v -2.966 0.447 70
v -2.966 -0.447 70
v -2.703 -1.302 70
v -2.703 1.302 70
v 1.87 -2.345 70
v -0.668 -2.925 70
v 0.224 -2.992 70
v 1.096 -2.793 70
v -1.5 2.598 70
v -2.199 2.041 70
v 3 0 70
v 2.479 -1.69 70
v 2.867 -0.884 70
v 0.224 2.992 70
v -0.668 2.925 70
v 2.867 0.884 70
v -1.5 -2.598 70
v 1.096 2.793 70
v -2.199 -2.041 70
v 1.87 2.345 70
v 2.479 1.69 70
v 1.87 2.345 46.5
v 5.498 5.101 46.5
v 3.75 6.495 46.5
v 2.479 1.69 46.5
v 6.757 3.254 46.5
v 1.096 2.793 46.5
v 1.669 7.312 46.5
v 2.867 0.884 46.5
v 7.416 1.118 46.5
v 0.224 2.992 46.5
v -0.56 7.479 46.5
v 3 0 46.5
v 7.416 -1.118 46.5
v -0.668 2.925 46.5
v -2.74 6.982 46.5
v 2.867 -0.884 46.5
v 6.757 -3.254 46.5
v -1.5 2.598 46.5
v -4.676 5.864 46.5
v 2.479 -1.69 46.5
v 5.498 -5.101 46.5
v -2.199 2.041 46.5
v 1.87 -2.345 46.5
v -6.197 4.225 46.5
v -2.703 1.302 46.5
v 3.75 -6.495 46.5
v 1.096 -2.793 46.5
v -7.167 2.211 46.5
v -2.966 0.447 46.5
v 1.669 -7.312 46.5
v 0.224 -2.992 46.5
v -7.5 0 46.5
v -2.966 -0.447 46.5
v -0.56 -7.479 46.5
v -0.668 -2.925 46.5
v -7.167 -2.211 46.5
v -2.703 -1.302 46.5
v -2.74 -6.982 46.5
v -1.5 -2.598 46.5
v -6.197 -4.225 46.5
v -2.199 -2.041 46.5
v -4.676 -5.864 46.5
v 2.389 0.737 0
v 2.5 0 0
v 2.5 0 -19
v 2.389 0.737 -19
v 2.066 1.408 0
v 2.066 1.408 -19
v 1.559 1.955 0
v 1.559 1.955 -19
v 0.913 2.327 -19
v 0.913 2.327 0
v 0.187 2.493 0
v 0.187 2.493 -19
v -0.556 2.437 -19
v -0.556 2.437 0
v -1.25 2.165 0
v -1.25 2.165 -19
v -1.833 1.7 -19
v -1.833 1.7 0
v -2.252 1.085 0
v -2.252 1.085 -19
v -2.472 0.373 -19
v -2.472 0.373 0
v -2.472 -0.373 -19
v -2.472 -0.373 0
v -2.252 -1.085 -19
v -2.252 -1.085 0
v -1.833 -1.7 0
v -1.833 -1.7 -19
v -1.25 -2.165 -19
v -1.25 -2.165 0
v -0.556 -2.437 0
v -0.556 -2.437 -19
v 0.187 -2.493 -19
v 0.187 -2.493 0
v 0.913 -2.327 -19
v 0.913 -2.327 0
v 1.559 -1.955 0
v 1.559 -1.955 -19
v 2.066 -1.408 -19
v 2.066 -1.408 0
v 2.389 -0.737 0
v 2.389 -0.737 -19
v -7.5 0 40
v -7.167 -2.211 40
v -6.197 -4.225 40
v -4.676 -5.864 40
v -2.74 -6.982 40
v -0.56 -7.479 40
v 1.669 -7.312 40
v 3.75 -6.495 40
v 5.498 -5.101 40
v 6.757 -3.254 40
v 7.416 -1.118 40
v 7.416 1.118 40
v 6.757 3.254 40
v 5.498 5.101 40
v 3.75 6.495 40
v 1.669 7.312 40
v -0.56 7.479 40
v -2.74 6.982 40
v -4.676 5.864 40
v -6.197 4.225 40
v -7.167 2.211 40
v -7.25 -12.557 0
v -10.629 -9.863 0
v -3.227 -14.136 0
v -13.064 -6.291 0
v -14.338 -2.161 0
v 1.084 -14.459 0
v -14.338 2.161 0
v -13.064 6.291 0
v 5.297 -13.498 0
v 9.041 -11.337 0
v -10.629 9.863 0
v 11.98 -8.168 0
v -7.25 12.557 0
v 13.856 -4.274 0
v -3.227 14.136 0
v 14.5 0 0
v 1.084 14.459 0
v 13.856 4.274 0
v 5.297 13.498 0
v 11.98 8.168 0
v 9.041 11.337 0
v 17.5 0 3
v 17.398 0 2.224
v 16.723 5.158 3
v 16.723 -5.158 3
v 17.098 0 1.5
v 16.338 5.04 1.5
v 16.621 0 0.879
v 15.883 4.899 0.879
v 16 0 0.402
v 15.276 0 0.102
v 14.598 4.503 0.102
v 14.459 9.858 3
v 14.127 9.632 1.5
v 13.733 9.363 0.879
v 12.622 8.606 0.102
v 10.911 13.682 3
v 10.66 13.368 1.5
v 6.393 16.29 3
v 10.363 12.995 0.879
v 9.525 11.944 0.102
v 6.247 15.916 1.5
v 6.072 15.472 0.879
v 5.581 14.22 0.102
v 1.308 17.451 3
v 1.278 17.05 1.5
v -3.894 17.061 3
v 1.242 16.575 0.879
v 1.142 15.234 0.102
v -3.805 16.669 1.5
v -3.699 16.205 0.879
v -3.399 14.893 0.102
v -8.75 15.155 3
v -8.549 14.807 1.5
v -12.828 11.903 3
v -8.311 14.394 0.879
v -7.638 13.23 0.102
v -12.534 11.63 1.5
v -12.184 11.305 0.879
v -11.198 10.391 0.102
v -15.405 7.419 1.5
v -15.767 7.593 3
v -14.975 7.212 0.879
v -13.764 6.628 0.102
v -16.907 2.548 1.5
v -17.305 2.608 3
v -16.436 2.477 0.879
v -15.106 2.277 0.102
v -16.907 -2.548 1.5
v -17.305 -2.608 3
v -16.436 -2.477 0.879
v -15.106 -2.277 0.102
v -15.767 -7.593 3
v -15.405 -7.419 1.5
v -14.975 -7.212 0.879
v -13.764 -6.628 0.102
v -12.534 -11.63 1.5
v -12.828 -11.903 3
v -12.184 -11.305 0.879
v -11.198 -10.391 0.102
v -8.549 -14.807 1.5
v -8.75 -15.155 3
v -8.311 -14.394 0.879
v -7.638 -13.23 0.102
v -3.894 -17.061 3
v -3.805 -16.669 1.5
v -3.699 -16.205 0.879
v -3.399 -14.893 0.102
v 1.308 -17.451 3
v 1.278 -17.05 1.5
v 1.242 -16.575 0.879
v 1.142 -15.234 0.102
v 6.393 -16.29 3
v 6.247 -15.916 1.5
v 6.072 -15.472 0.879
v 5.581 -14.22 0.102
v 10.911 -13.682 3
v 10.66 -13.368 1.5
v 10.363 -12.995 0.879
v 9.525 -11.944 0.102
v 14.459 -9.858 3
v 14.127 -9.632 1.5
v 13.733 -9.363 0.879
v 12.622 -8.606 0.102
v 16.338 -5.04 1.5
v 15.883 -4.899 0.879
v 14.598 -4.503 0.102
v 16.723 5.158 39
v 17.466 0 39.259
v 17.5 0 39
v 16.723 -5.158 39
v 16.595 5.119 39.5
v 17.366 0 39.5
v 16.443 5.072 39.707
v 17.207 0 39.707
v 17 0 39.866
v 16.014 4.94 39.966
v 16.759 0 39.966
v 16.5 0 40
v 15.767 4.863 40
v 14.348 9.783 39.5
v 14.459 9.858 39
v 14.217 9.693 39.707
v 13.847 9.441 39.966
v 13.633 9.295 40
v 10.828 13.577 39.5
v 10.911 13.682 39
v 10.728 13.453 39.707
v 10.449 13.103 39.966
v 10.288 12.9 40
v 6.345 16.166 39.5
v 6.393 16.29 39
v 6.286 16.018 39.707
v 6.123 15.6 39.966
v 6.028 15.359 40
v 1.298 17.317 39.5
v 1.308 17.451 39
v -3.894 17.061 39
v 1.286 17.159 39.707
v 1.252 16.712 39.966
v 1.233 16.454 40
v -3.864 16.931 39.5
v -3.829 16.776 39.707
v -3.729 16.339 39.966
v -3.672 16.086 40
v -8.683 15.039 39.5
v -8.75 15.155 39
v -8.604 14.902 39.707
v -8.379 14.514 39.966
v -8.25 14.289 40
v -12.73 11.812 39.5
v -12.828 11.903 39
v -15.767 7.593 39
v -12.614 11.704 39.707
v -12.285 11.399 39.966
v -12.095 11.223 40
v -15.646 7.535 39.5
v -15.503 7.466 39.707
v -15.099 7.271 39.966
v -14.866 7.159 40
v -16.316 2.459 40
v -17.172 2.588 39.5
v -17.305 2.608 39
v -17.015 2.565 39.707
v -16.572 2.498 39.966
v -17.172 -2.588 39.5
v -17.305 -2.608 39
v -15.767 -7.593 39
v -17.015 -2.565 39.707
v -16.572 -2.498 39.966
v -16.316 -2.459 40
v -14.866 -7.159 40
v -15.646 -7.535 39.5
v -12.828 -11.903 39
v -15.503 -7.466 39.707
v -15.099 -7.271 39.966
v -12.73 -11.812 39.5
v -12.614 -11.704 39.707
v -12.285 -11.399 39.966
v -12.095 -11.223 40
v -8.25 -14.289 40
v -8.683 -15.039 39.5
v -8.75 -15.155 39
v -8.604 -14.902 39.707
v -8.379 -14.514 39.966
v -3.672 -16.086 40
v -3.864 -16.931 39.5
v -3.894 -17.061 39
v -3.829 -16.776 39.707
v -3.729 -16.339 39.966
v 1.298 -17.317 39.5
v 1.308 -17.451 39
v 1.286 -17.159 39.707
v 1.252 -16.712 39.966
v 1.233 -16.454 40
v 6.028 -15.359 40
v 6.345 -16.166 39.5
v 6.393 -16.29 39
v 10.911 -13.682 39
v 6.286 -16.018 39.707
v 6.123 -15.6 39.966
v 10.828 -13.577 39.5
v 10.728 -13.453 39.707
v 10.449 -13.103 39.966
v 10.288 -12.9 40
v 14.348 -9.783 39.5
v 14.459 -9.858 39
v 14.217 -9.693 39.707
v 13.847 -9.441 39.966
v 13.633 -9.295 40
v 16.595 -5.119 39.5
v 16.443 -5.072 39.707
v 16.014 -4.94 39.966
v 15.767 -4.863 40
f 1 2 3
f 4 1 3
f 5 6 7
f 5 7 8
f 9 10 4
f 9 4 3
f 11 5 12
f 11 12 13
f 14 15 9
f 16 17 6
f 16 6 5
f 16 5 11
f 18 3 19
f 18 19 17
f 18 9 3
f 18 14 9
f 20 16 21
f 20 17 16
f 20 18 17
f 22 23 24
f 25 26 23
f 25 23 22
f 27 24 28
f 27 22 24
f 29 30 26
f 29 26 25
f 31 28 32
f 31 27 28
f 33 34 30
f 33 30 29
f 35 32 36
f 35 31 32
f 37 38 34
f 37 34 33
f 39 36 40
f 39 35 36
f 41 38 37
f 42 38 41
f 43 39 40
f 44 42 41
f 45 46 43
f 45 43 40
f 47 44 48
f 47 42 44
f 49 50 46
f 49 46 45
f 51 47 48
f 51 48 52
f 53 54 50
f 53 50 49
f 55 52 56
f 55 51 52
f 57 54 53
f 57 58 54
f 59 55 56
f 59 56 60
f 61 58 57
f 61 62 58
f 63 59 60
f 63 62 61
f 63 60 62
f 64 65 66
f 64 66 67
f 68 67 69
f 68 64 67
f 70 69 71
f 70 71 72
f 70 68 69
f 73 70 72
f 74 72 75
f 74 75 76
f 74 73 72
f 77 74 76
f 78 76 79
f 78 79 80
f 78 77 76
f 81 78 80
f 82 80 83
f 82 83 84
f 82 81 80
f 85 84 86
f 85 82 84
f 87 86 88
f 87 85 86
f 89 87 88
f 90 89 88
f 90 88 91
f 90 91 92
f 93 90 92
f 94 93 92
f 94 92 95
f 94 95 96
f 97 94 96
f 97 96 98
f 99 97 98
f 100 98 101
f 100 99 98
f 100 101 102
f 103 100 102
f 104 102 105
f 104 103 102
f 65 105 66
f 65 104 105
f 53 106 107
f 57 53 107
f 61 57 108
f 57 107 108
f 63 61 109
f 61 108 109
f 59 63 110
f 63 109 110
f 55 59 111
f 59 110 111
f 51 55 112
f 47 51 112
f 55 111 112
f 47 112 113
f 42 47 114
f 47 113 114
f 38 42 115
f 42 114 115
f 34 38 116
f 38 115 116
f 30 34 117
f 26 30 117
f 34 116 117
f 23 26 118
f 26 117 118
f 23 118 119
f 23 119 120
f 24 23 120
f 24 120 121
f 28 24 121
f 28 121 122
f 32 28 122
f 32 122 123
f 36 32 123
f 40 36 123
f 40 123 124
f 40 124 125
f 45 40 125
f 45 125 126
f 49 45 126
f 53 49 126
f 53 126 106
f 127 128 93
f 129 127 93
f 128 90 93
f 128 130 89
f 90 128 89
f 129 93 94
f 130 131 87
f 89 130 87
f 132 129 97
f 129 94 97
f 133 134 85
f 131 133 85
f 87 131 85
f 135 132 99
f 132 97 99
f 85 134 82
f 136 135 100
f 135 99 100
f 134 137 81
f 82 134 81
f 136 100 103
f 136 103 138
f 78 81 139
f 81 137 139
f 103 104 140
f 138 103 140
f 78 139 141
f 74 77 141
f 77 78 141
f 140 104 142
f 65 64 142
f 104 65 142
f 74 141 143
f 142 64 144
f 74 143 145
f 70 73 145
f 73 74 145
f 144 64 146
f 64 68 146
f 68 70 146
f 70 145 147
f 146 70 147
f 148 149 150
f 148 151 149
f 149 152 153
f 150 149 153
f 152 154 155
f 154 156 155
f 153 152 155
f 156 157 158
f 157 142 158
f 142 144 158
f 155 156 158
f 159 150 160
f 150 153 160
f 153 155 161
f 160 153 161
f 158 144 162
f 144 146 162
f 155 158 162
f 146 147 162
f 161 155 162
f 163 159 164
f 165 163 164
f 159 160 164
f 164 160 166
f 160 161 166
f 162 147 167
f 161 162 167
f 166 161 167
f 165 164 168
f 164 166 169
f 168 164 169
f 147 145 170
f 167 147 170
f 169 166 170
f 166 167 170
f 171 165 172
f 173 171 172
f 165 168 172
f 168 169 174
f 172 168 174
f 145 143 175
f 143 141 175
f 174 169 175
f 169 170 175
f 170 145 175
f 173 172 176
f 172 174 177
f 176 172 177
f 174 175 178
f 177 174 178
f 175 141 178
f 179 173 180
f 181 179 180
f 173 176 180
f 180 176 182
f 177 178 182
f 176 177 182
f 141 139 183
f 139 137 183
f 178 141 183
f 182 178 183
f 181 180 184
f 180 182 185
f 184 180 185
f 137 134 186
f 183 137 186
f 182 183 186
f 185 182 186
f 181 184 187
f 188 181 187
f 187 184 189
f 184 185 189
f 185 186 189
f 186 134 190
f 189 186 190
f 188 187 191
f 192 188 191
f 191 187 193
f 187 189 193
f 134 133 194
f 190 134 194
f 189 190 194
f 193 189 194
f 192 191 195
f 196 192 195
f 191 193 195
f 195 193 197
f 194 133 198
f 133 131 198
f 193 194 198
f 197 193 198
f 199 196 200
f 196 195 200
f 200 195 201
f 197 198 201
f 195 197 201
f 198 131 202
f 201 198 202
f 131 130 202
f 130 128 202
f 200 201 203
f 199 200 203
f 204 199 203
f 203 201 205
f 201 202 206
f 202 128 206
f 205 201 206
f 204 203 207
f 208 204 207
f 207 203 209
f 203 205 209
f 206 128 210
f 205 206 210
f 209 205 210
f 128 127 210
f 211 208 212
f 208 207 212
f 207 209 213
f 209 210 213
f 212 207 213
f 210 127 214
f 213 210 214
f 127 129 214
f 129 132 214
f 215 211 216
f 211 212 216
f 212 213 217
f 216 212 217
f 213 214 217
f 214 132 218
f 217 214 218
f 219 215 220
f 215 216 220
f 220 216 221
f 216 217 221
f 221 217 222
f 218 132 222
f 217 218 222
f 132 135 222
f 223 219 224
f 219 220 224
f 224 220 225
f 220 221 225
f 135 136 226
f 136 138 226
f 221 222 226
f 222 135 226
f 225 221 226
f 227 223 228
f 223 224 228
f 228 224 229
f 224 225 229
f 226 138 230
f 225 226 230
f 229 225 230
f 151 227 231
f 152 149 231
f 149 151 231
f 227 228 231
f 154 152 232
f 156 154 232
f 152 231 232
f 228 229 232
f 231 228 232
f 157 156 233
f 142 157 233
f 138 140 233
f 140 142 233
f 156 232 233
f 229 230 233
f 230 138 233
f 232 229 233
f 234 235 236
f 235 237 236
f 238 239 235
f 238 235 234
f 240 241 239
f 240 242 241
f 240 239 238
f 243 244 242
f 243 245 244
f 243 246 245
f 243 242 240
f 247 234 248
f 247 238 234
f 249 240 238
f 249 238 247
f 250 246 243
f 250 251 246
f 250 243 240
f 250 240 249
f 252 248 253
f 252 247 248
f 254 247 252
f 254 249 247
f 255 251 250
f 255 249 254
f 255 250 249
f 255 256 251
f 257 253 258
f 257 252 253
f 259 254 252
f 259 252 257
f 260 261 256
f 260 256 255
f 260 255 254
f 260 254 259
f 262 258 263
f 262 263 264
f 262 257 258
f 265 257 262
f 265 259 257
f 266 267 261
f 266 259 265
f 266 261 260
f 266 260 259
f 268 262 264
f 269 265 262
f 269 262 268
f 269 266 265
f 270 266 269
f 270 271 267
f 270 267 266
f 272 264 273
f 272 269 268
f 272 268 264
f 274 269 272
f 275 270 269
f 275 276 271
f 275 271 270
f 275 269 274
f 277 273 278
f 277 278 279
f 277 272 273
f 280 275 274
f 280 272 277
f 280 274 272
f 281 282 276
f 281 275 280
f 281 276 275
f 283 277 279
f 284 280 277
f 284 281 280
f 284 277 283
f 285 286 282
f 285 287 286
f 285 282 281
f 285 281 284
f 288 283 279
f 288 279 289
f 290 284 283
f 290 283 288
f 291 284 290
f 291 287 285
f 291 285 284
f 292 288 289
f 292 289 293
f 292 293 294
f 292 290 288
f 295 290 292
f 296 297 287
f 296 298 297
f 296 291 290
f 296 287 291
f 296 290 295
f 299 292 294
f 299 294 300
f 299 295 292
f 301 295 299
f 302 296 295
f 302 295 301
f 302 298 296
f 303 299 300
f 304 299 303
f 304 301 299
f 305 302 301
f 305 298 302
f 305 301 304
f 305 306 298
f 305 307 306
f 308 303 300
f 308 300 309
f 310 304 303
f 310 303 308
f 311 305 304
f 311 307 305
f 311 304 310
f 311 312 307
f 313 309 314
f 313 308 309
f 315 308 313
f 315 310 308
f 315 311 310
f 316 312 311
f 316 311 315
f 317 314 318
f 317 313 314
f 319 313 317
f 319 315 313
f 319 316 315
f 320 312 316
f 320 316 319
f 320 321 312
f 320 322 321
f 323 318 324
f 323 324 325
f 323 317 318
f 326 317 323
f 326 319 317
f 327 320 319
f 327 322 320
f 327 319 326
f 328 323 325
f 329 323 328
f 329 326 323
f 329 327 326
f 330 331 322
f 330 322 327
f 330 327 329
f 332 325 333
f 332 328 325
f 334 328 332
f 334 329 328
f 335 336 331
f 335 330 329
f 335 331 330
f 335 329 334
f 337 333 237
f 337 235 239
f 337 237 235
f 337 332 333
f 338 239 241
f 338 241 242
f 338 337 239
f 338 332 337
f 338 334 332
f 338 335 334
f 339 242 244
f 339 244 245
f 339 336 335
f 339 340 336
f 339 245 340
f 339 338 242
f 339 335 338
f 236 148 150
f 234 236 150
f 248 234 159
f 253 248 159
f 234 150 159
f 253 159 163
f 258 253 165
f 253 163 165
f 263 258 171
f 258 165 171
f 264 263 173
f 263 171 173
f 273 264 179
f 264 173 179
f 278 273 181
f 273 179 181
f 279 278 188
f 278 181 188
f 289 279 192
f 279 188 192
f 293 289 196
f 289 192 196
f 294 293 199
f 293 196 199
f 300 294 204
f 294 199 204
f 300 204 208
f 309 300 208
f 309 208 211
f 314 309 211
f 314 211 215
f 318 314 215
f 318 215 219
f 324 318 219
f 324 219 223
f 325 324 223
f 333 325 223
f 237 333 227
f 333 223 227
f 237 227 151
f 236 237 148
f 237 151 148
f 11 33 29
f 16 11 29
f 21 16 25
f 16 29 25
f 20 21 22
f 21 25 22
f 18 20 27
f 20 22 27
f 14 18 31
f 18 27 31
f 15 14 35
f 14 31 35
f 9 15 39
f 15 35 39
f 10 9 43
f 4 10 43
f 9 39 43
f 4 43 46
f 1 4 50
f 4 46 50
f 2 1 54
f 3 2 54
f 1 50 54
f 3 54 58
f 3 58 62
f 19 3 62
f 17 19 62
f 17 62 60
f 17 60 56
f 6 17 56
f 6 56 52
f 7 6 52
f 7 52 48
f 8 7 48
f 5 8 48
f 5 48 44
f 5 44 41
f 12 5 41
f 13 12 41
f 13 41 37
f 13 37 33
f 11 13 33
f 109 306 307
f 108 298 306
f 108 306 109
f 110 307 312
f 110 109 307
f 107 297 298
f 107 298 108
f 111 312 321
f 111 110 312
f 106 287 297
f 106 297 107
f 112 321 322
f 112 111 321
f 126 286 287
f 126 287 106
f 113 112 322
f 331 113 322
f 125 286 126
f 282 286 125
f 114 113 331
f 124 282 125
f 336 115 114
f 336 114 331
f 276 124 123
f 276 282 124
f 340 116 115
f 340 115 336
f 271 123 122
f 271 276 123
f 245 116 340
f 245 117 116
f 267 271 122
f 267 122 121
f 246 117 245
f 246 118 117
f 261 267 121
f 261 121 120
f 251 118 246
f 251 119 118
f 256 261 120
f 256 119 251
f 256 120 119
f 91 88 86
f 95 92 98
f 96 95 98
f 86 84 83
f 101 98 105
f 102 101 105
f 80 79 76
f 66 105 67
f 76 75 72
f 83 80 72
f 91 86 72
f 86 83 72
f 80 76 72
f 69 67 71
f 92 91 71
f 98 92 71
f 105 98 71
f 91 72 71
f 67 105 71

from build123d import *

# Parameters (mm, degrees)
SKETCH1_R           = 17.5
BOSS_EXTRUDE2_DEPTH = 40
SKETCH1_3_R         = 2.5
BOSS_EXTRUDE3_DEPTH = 19
SKETCH1_4_R         = 5.5
BOSS_EXTRUDE4_DEPTH = 42
SKETCH1_5_R         = 3
BOSS_EXTRUDE5_DEPTH = 70
SKETCH1_6_R         = 7.5
BOSS_EXTRUDE6_DEPTH = 46.5
FILLET1_R           = 1
FILLET2_R           = 3


with BuildPart() as part:
    # Sketch1 → Boss-Extrude2 (new body)
    with BuildSketch(Plane.XY):
        Circle(SKETCH1_R)
    extrude(amount=BOSS_EXTRUDE2_DEPTH)

    # Sketch1<3> → Boss-Extrude3 (add)
    with BuildSketch(Plane.XY):
        Circle(SKETCH1_3_R)
    extrude(amount=-BOSS_EXTRUDE3_DEPTH)

    # Sketch1<4> → Boss-Extrude4 (add)
    with BuildSketch(Plane.XY):
        Circle(SKETCH1_4_R)
    extrude(amount=BOSS_EXTRUDE4_DEPTH)

    # Sketch1<5> → Boss-Extrude5 (add)
    with BuildSketch(Plane.XY):
        Circle(SKETCH1_5_R)
    extrude(amount=BOSS_EXTRUDE5_DEPTH)

    # Sketch1<6> → Boss-Extrude6 (add)
    with BuildSketch(Plane.XY):
        Circle(SKETCH1_6_R)
    extrude(amount=BOSS_EXTRUDE6_DEPTH)

    # Fillet1
    fillet1_edges = [part.edges().sort_by_distance(p)[0] for p in [
        (-17.5, 0, 40),
    ]]
    fillet(fillet1_edges, radius=FILLET1_R)

    # Fillet2
    fillet2_edges = [part.edges().sort_by_distance(p)[0] for p in [
        (-17.5, 0, 0),
    ]]
    fillet(fillet2_edges, radius=FILLET2_R)


solid = part.part
